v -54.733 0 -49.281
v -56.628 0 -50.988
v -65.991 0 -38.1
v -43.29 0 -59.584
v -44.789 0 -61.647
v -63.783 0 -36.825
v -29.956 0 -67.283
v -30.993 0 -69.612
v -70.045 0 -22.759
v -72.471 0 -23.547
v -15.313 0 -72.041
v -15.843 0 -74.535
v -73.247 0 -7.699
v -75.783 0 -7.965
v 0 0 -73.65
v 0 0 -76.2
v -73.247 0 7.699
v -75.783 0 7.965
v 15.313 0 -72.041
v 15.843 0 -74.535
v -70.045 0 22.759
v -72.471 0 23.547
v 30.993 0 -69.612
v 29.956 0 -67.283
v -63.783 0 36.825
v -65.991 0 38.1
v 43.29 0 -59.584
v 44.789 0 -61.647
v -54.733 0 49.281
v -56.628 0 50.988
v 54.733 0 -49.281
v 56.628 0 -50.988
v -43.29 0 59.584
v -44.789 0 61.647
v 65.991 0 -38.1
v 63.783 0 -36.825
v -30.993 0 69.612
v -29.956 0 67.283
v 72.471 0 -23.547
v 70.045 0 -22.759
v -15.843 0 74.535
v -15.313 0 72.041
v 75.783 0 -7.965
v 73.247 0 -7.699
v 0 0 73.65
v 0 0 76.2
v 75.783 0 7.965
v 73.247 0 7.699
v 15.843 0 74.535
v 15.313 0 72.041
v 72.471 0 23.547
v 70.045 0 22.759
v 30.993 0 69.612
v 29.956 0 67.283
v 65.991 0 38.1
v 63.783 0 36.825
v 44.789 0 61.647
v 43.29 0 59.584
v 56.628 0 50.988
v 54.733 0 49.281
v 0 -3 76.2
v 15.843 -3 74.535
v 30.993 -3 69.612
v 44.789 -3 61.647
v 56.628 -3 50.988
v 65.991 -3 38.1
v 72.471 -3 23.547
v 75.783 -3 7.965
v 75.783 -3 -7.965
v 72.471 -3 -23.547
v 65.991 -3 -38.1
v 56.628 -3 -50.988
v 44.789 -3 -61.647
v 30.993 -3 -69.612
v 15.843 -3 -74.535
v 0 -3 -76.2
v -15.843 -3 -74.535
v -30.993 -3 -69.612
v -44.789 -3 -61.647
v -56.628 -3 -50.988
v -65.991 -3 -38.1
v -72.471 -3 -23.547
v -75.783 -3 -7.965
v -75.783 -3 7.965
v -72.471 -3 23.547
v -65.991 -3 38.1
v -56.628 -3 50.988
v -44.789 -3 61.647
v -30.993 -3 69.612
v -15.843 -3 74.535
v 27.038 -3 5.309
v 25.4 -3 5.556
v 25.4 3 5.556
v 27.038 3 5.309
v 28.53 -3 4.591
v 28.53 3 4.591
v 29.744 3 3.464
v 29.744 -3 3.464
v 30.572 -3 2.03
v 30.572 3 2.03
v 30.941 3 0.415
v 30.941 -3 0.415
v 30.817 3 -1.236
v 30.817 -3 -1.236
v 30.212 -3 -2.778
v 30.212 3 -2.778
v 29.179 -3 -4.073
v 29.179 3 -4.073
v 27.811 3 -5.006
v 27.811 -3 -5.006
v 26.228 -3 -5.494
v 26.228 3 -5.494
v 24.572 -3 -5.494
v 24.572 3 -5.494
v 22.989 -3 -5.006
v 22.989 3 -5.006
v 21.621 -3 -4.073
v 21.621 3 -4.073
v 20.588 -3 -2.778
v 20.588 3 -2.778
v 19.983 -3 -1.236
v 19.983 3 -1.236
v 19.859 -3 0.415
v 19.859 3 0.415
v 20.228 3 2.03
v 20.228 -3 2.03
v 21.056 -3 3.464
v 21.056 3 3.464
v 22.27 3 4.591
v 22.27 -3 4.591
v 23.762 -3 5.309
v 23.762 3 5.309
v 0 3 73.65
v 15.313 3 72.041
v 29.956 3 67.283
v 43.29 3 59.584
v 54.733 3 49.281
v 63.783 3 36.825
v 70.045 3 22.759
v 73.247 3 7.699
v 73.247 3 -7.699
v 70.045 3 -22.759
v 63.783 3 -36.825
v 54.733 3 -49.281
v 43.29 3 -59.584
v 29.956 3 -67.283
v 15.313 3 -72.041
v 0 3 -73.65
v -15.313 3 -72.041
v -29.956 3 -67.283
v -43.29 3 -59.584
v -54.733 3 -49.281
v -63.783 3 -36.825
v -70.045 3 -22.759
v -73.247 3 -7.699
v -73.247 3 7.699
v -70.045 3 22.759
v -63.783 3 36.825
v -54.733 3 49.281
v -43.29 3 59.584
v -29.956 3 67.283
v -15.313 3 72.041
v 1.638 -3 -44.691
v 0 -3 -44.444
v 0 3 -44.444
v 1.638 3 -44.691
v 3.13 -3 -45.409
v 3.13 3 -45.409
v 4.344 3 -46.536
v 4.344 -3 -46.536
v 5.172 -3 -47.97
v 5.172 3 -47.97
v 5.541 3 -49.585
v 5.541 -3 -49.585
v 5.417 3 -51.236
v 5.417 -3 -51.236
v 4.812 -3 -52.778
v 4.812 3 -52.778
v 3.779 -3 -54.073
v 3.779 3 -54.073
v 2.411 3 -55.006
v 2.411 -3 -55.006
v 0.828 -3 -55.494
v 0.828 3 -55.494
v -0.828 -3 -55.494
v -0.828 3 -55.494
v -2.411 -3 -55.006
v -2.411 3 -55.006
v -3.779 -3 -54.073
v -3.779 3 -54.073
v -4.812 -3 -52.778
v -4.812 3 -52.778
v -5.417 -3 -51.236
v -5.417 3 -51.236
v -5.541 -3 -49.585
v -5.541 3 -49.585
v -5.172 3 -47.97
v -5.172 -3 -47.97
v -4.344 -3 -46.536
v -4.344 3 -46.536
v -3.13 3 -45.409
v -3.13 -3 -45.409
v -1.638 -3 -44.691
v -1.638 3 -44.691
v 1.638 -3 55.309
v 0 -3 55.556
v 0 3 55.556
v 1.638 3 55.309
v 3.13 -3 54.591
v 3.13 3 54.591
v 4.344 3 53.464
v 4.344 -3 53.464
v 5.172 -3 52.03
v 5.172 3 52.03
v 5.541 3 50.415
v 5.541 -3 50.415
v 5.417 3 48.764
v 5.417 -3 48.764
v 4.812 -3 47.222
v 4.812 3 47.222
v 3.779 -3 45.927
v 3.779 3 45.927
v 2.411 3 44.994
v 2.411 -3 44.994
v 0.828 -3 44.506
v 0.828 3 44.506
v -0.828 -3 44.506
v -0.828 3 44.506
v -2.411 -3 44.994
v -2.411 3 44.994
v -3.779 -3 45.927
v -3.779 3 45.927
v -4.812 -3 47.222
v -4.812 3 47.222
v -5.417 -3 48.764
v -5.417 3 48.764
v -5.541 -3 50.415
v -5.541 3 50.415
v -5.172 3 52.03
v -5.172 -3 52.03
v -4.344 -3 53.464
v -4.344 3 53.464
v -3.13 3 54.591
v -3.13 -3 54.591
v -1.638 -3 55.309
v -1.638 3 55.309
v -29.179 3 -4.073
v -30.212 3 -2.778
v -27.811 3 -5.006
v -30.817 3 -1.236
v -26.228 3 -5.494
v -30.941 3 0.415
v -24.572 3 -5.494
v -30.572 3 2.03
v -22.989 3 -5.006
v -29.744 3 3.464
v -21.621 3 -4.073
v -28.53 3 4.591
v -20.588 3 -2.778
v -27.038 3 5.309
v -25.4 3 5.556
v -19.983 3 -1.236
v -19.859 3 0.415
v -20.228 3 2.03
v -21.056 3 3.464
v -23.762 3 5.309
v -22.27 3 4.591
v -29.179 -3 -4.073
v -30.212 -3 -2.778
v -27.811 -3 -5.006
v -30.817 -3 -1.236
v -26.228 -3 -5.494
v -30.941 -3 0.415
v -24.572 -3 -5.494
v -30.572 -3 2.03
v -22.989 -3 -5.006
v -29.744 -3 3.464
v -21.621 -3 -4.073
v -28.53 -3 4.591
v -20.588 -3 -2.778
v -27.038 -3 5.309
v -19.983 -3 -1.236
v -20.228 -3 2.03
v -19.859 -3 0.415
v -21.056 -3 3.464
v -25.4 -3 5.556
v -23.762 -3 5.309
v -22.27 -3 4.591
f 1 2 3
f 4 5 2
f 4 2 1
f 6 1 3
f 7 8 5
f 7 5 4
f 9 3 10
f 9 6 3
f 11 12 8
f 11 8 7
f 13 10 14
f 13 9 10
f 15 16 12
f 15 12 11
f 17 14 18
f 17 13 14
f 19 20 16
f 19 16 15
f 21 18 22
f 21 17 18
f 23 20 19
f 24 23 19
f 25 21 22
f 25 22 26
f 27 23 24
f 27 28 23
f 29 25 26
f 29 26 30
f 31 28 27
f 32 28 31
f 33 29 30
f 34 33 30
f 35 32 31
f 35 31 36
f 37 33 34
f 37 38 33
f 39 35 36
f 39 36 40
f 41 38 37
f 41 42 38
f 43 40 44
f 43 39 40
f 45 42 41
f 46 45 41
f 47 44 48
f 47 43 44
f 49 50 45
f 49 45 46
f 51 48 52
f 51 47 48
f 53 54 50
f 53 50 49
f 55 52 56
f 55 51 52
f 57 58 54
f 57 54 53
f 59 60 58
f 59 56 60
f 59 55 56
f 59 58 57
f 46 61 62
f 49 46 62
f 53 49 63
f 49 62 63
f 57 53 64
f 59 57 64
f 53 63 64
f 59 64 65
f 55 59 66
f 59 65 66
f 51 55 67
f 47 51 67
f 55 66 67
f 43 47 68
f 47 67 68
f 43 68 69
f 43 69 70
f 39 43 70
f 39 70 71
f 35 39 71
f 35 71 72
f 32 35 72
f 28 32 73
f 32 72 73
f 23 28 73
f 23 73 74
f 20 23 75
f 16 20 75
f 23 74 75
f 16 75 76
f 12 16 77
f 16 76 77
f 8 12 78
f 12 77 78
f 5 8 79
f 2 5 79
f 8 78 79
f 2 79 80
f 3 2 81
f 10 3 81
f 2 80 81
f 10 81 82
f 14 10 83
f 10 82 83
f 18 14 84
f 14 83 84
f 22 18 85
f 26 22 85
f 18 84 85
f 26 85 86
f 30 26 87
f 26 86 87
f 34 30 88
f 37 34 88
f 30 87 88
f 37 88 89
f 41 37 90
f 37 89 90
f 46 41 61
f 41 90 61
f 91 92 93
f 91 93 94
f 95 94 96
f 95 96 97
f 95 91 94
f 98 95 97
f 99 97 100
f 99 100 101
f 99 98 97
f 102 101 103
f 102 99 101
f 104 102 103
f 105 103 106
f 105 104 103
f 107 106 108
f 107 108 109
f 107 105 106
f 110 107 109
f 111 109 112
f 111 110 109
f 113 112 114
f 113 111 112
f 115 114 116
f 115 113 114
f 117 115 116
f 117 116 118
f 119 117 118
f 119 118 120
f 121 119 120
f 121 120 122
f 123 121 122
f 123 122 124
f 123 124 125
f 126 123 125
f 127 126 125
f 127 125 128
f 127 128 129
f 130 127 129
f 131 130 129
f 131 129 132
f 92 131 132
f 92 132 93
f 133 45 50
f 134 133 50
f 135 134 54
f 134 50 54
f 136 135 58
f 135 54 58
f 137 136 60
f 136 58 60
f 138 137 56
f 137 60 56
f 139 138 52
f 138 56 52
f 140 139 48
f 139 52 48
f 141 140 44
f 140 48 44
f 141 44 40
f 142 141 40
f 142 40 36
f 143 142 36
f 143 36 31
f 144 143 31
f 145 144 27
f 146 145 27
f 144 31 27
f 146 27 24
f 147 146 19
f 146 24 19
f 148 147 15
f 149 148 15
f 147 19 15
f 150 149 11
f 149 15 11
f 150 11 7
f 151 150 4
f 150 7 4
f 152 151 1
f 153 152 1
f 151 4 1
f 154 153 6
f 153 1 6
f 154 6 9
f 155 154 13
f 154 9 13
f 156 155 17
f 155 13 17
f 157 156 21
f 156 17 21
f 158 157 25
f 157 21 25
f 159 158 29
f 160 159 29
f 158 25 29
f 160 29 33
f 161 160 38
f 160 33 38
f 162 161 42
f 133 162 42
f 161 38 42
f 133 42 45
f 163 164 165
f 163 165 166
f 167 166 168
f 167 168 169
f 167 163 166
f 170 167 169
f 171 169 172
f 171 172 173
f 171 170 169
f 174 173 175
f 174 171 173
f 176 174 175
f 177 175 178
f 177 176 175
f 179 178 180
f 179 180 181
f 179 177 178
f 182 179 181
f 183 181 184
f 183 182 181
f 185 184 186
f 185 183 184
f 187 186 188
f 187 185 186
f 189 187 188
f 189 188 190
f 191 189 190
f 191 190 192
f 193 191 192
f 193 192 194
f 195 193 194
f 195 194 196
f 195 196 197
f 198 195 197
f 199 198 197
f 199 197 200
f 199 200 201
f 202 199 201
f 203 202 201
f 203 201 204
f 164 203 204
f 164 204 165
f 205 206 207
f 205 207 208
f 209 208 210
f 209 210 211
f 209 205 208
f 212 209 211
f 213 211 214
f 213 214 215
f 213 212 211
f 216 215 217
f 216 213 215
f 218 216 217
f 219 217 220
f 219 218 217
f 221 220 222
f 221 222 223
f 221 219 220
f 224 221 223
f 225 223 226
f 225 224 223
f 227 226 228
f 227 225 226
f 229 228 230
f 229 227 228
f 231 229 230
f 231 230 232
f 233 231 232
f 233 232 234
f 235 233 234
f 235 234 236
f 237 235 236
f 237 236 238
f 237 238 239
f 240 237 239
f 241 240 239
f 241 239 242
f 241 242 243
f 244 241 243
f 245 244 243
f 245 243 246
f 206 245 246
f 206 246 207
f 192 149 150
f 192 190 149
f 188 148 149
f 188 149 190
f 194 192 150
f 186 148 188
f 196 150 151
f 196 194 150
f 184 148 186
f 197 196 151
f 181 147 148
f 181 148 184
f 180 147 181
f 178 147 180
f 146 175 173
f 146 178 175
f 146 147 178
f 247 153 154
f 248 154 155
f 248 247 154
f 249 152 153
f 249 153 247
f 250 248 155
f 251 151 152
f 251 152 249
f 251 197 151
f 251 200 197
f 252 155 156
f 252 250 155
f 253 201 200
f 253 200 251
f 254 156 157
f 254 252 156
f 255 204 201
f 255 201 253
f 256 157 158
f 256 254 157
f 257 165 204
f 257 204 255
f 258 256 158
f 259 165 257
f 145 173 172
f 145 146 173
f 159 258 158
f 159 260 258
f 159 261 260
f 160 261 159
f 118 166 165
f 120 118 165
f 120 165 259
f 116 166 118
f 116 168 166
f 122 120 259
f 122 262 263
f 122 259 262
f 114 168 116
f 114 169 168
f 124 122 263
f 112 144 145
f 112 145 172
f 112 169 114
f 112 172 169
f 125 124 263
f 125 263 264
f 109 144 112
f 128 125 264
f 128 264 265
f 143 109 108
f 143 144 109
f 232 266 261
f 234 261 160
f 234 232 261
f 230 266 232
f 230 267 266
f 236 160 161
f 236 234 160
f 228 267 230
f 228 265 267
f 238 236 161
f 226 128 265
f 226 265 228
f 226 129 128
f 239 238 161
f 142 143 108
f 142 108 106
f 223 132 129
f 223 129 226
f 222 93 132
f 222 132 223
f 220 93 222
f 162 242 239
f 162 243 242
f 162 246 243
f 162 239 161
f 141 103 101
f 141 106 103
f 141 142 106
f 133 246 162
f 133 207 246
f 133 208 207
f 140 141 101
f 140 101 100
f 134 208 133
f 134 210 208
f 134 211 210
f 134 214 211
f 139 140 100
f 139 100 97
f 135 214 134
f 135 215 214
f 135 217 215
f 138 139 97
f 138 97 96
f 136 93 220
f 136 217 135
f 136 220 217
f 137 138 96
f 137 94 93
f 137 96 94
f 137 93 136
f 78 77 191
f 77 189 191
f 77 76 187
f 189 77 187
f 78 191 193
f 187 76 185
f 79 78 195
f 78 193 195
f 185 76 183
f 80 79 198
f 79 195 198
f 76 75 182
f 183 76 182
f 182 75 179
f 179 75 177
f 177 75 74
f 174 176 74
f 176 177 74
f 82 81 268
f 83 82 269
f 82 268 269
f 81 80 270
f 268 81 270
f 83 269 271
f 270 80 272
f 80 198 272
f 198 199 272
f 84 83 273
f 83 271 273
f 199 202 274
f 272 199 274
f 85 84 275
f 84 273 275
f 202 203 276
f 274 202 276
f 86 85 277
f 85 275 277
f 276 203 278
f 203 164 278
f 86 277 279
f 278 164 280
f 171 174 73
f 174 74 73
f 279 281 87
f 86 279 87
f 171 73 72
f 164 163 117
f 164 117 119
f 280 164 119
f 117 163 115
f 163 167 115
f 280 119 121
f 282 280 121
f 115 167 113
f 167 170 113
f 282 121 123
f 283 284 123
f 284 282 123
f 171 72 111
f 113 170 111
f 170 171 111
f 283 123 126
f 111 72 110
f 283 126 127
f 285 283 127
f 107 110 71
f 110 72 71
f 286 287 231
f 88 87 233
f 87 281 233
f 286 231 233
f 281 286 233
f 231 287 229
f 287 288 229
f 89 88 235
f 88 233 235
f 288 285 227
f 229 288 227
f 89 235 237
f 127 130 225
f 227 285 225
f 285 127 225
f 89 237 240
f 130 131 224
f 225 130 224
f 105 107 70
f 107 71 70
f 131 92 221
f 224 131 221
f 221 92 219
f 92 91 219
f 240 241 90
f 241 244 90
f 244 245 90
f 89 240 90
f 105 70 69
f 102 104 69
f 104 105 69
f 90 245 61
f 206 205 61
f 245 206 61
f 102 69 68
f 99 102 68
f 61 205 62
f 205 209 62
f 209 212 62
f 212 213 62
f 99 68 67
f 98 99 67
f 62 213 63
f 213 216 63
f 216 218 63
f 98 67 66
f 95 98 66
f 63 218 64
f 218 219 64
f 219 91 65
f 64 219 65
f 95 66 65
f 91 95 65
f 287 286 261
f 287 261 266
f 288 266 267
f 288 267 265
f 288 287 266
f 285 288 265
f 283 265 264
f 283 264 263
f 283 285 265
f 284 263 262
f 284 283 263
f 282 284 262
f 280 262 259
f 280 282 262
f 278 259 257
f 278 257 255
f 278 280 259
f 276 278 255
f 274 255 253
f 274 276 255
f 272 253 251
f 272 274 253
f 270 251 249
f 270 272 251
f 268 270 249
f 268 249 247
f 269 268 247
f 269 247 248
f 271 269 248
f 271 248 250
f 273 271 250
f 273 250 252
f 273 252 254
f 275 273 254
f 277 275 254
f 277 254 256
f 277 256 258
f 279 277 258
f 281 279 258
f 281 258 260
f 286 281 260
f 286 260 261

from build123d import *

# Parameters (mm, degrees)
SKETCH1_R           = 73.65
SKETCH1_R_2         = 5.55625
BOSS_EXTRUDE1_DEPTH = 3
BOSS_EXTRUDE2_START = -3
SKETCH1_3_R         = 76.2
SKETCH1_3_R_2       = 5.55625
BOSS_EXTRUDE2_DEPTH = 3


with BuildPart() as part:
    # Sketch1 → Boss-Extrude1 (new body)
    with BuildSketch(Plane(origin=(0, 0, 0), x_dir=(1, 0, 0), z_dir=(0, 1, 0))):
        Circle(SKETCH1_R)
        with Locations((0, -50)):
            Circle(SKETCH1_R_2, mode=Mode.SUBTRACT)
        with Locations((-25.4, 0)):
            Circle(SKETCH1_R_2, mode=Mode.SUBTRACT)
        with Locations((25.4, 0)):
            Circle(SKETCH1_R_2, mode=Mode.SUBTRACT)
        with Locations((0, 50)):
            Circle(SKETCH1_R_2, mode=Mode.SUBTRACT)
    extrude(amount=BOSS_EXTRUDE1_DEPTH)

    # Sketch1<3> → Boss-Extrude2 (add)
    with BuildSketch(Plane(origin=(0, 0, 0), x_dir=(1, 0, 0), z_dir=(0, 1, 0)).offset(BOSS_EXTRUDE2_START)):
        Circle(SKETCH1_3_R)
        with Locations((0, 50)):
            Circle(SKETCH1_3_R_2, mode=Mode.SUBTRACT)
        with Locations((0, -50)):
            Circle(SKETCH1_3_R_2, mode=Mode.SUBTRACT)
        with Locations((-25.4, 0)):
            Circle(SKETCH1_3_R_2, mode=Mode.SUBTRACT)
        with Locations((25.4, 0)):
            Circle(SKETCH1_3_R_2, mode=Mode.SUBTRACT)
    extrude(amount=BOSS_EXTRUDE2_DEPTH)


solid = part.part
